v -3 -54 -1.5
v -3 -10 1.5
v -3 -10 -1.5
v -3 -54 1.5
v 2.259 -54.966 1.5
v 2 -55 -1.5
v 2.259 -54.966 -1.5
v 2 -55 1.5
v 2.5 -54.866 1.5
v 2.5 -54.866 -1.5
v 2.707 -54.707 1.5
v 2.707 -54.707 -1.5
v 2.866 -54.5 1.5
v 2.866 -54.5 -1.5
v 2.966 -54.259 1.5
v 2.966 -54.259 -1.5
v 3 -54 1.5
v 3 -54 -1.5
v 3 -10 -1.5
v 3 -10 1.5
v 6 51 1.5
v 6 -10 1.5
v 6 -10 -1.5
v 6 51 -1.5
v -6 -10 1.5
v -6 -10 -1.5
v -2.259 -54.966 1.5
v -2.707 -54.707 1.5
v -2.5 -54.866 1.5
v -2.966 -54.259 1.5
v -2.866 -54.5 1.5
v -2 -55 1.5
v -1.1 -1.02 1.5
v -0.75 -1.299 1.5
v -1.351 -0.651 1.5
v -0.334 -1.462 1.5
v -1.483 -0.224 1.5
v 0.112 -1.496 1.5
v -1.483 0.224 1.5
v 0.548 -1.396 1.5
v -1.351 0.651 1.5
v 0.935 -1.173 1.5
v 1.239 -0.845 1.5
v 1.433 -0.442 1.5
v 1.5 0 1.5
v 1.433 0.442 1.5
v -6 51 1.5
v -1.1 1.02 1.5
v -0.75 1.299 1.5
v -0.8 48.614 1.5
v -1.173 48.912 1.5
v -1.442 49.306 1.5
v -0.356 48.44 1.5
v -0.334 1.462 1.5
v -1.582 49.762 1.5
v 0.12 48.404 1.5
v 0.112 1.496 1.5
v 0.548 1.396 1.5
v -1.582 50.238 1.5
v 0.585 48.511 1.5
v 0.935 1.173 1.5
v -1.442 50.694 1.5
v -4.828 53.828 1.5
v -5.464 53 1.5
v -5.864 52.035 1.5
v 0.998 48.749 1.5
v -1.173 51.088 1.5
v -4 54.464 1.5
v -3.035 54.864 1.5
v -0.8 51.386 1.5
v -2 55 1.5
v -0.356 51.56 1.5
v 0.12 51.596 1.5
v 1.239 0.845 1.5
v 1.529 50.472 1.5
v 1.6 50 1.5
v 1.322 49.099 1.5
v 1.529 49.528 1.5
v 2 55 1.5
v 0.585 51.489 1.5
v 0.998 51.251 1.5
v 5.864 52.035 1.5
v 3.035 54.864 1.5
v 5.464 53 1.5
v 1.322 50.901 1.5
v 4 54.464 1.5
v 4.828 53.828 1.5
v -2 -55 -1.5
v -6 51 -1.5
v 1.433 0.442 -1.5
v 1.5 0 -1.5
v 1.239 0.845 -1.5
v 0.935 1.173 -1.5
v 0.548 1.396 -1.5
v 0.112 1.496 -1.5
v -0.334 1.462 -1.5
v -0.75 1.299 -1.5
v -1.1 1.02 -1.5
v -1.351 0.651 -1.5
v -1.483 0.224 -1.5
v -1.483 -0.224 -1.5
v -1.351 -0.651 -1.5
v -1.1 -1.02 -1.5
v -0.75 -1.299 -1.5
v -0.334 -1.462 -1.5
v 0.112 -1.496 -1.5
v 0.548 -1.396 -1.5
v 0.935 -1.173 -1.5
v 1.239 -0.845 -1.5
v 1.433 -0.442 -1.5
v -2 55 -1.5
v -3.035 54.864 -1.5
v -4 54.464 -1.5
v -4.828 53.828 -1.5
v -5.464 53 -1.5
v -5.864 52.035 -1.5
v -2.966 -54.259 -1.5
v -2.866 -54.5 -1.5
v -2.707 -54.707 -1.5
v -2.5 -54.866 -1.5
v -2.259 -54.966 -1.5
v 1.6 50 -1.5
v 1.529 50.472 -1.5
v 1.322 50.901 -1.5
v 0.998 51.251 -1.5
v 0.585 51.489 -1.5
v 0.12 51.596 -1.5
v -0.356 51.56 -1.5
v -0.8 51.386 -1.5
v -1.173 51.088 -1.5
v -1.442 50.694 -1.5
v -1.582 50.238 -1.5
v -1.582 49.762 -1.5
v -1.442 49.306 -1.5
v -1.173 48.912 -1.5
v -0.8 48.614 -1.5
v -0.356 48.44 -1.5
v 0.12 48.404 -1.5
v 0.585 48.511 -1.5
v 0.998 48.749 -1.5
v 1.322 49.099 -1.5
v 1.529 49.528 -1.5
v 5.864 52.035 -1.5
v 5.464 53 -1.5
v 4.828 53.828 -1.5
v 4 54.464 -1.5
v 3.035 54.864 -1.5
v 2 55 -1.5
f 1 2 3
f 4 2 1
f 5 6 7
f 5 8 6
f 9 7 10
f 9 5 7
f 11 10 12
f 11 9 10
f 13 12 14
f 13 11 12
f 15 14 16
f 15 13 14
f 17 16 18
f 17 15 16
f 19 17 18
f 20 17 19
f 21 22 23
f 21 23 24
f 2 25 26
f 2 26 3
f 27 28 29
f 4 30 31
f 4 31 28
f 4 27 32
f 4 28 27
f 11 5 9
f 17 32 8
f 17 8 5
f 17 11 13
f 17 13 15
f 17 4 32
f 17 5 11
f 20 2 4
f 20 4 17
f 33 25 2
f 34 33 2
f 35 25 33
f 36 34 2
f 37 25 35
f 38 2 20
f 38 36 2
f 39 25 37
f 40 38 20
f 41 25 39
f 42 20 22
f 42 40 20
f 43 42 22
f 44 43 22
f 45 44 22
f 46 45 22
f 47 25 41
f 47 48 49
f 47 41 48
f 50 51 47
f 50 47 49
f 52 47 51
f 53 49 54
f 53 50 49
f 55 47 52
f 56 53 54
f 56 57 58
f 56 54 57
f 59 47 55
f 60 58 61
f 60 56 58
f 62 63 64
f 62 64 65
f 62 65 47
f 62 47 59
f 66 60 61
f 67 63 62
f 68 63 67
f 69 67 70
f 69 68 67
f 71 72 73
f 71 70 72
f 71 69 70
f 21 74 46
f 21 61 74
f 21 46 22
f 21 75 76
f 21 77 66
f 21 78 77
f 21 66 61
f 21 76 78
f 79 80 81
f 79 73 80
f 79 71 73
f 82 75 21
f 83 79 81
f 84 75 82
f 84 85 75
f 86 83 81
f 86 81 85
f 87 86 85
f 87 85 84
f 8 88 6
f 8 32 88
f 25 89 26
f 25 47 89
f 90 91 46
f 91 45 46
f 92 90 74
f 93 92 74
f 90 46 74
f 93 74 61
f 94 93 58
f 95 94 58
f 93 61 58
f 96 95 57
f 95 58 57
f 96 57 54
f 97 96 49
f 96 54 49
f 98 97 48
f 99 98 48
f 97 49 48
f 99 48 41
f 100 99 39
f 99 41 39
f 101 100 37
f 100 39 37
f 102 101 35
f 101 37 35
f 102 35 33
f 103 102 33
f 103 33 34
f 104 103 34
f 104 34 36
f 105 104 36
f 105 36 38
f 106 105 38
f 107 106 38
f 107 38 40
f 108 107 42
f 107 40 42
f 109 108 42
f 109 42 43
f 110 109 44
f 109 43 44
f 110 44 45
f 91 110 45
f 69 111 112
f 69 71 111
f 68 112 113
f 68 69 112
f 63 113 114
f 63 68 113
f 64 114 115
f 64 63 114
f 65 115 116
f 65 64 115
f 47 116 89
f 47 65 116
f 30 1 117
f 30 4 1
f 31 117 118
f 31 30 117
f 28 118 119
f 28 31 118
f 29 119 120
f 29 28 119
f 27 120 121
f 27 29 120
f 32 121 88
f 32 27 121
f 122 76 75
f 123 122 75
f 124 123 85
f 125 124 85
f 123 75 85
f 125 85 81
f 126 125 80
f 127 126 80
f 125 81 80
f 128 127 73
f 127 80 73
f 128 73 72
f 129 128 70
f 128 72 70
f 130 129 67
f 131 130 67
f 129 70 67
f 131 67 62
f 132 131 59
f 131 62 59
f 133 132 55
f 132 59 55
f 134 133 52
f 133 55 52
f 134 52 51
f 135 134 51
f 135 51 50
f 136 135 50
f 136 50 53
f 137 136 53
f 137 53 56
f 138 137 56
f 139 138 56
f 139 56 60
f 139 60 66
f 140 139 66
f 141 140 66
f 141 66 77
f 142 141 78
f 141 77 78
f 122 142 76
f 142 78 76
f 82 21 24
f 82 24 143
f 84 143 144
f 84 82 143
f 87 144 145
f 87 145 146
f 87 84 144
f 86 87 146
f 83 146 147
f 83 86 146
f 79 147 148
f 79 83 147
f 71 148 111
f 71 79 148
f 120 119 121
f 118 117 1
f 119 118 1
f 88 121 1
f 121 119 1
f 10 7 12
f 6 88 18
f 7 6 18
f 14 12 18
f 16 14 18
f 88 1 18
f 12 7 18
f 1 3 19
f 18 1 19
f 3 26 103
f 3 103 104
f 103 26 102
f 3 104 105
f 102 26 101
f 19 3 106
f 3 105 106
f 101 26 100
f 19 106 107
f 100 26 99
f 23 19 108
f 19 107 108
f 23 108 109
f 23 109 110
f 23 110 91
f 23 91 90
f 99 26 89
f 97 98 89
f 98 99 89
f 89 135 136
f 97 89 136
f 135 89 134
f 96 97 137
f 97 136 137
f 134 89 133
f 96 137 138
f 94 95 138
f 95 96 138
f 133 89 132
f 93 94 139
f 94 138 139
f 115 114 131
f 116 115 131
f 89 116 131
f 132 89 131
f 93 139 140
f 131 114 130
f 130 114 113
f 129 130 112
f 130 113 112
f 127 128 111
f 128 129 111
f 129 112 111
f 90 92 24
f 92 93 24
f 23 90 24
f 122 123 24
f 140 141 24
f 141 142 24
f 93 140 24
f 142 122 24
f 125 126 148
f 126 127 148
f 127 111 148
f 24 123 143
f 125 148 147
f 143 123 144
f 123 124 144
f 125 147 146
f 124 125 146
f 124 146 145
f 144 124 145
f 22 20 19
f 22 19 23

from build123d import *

# Parameters (mm, degrees)
SALIENTE_EXTRUIR1_DEPTH = 1.5
CROQUIS2_R              = 1.6
CORTAR_EXTRUIR1_DEPTH   = 3
REDONDEO1_R             = 1
CROQUIS3_R              = 1.5
CORTAR_EXTRUIR2_DEPTH   = 5


with BuildPart() as part:
    # Croquis1 → Saliente-Extruir1 (new, symmetric)
    with BuildSketch(Plane.XY):
        with BuildLine():
            Line((-6, 51), (-6, -10))
            Line((-6, -10), (-3, -10))
            Line((-3, -10), (-3, -55))
            Line((-3, -55), (3, -55))
            Line((3, -55), (3, -10))
            Line((3, -10), (6, -10))
            Line((6, -10), (6, 51))
            ThreePointArc((6, 51), (4.828427125, 53.828427125), (2, 55))
            Line((2, 55), (-2, 55))
            ThreePointArc((-2, 55), (-4.828427125, 53.828427125), (-6, 51))
        make_face()
    extrude(amount=SALIENTE_EXTRUIR1_DEPTH, both=True)

    # Croquis2 → Cortar-Extruir1 (cut)
    with BuildSketch(Plane.XY.offset(1.5)):
        with Locations((0, 50)):
            Circle(CROQUIS2_R)
    extrude(amount=-CORTAR_EXTRUIR1_DEPTH, mode=Mode.SUBTRACT)

    # Redondeo1
    redondeo1_edges = [part.edges().sort_by_distance(p)[0] for p in [
        (3, -55, 0),
        (-3, -55, 0),
    ]]
    fillet(redondeo1_edges, radius=REDONDEO1_R)

    # Croquis3 → Cortar-Extruir2 (cut, symmetric)
    with BuildSketch(Plane.XY):
        Circle(CROQUIS3_R)
    extrude(amount=CORTAR_EXTRUIR2_DEPTH, both=True, mode=Mode.SUBTRACT)


solid = part.part
